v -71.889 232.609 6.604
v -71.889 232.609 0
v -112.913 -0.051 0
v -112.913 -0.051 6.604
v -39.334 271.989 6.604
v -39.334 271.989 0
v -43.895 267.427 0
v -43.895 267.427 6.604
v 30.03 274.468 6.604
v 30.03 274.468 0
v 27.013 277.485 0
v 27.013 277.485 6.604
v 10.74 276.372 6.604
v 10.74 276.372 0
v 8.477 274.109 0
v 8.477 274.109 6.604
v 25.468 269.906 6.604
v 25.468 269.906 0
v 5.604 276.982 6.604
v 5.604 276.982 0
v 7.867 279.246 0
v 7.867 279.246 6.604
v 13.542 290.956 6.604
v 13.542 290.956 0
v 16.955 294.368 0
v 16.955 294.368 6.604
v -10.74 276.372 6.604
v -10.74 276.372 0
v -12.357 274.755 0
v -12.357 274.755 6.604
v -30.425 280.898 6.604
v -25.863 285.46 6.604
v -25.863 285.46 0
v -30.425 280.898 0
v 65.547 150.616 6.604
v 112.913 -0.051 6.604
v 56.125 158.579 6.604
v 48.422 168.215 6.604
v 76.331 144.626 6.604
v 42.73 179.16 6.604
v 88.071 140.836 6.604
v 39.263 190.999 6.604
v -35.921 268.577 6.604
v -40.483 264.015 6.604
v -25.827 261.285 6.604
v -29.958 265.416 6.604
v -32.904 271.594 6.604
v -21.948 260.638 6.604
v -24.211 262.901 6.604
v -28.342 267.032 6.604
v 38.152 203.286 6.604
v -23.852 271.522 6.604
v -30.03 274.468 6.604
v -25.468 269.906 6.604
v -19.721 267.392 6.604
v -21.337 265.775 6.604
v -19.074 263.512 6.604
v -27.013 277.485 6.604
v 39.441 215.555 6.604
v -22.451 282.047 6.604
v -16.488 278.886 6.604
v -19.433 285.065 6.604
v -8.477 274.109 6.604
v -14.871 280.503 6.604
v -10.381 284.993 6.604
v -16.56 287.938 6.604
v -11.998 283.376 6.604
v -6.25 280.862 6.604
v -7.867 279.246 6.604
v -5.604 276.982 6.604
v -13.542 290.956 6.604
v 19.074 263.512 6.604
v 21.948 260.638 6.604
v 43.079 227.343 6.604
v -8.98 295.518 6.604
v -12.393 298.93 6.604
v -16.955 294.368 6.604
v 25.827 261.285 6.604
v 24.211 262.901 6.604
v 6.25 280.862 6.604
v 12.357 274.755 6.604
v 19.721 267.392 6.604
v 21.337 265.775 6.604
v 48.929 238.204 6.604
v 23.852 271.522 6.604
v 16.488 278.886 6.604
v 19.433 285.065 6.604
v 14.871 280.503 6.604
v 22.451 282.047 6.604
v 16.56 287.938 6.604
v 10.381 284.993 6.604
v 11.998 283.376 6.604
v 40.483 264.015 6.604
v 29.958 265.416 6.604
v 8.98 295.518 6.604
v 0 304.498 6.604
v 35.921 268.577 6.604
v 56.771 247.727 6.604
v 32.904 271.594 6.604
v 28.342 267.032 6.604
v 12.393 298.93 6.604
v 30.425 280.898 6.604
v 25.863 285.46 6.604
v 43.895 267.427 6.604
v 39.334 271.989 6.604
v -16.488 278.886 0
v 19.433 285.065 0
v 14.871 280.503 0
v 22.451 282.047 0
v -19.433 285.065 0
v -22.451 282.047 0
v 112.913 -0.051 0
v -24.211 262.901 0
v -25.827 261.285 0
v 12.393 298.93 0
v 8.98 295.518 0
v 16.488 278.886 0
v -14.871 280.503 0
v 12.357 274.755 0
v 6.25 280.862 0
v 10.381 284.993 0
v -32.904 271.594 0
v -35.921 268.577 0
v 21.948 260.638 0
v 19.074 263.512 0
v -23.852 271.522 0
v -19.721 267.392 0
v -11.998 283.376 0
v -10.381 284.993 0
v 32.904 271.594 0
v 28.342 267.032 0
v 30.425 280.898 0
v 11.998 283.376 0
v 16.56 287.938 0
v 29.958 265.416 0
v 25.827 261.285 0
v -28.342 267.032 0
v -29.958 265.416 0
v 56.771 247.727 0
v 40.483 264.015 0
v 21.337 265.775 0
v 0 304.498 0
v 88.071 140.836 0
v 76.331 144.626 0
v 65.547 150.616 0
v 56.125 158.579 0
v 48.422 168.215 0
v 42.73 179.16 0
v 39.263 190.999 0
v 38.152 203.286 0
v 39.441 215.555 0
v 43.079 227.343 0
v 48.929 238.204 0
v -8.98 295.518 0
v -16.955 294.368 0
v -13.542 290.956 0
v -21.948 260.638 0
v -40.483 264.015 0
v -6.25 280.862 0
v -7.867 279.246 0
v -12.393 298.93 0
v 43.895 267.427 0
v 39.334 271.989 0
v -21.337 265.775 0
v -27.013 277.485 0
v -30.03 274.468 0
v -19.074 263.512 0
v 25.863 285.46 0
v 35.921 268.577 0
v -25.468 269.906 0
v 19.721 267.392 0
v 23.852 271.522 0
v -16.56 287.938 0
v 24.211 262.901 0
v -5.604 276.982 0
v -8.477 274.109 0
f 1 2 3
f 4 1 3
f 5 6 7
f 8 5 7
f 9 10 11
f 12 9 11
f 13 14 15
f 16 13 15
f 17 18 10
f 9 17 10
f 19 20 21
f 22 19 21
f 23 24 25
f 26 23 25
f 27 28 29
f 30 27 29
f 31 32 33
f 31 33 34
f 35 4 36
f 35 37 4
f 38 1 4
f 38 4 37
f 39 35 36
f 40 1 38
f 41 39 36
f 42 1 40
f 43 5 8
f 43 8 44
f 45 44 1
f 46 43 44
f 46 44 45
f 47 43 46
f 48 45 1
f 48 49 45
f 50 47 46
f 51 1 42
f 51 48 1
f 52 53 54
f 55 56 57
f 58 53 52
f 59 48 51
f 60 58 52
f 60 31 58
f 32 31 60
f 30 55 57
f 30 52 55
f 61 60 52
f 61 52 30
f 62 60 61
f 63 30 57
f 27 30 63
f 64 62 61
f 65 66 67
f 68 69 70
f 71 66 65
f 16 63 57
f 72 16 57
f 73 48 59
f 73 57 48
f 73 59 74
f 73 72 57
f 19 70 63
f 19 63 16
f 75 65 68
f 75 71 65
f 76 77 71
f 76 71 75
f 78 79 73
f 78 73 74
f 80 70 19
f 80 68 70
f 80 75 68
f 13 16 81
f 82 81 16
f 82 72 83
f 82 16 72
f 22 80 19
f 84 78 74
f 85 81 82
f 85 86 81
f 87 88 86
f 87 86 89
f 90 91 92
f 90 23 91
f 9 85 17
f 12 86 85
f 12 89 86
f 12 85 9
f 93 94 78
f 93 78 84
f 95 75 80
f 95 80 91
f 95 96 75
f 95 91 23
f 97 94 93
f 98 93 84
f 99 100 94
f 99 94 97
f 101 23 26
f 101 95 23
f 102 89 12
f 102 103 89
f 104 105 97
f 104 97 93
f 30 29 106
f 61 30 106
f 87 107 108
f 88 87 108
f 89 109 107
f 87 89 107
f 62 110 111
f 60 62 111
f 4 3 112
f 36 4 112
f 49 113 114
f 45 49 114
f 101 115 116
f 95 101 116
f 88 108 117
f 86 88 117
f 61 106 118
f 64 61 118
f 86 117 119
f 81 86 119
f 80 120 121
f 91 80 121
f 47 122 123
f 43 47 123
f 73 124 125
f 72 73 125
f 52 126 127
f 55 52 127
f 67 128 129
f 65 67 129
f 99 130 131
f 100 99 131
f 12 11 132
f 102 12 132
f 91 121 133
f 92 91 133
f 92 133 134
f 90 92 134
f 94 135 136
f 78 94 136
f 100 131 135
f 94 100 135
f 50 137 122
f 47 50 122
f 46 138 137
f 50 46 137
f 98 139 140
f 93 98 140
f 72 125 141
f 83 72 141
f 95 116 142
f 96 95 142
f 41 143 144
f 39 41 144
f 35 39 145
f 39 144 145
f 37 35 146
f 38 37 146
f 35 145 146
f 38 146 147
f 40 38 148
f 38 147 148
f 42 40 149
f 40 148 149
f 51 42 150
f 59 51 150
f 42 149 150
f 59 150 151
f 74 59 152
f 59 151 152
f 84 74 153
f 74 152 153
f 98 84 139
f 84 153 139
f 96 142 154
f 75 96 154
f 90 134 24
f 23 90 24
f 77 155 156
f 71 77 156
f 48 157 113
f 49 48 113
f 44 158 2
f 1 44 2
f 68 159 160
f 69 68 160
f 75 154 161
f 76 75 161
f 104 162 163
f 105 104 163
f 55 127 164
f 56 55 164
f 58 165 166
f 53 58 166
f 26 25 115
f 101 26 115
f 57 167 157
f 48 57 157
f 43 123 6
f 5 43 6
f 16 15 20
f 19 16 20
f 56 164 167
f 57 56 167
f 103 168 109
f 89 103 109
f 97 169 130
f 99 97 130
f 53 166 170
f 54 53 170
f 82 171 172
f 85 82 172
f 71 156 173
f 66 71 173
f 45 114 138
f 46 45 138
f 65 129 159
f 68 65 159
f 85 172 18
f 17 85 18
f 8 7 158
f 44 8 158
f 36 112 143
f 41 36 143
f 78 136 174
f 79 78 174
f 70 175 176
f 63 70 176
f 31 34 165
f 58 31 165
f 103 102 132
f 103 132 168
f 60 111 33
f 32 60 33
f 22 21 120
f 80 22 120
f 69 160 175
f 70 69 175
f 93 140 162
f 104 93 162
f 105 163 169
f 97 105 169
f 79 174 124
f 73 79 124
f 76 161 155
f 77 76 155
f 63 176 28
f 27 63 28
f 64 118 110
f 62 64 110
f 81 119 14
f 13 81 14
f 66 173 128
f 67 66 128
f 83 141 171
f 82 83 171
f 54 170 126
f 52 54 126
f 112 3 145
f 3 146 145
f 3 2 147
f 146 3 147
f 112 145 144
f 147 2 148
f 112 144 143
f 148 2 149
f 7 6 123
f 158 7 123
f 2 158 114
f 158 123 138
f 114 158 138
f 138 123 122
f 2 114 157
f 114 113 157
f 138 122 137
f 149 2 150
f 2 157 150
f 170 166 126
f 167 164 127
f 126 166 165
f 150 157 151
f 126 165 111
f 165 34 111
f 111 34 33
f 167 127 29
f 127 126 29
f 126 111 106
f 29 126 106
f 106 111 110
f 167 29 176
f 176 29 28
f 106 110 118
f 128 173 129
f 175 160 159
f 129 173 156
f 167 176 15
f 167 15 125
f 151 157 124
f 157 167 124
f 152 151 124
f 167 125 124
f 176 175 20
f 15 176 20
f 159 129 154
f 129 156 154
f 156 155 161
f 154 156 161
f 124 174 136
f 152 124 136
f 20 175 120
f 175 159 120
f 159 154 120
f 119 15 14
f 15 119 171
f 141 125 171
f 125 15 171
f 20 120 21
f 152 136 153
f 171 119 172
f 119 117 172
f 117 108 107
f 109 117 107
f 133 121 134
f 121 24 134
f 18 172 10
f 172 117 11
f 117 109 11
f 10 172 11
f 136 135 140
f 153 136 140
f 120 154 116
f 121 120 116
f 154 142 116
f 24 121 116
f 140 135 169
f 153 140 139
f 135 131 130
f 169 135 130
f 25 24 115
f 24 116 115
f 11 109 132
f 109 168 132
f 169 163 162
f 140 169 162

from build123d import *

# Parameters (mm, degrees)
BOSS_EXTRUDE1_DEPTH = 6.604
CUT_EXTRUDE1_DEPTH  = 325.737846372
BOSS_EXTRUDE2_DEPTH = 6.604
SKETCH6_R           = 63.5
CUT_EXTRUDE2_DEPTH  = 325.737846372
MOVE_FACE1_DEPTH    = 6.604


# Read off the part's stored shape, not the designer's step: Move Face1
with BuildPart() as part:
    # Sketch1 → Boss-Extrude1 (new body)
    with BuildSketch(Plane.XY):
        Polygon((0, 304.426146798), (71.842048969, 232.584097829), (112.8529007, 0), (0, 0), (-112.8529007, 0), (-71.842048969, 232.584097829), align=None)
    extrude(amount=BOSS_EXTRUDE1_DEPTH)

    # Sketch4 → Cut-Extrude1 (cut, through all)
    with BuildSketch(Plane.XY.offset(6.604)):
        Polygon((-11.997622178, 283.448268499), (-16.487750238, 287.93839656), (-19.433274246, 284.992872552), (-14.943146185, 280.502744491), (-16.559592287, 278.88629839), (-12.356832423, 274.683538525), (-10.740386321, 276.299984627), (-8.477361778, 274.036960084), (-5.531837771, 276.982484092), (-7.794862313, 279.245508635), (-6.178416211, 280.861954736), (-10.381176076, 285.064714601), align=None)
        Polygon((-25.468006359, 269.977884318), (-29.95813442, 274.468012378), (-32.903658428, 271.52248837), (-28.413530367, 267.03236031), (-30.029976469, 265.415914208), (-25.827216604, 261.213154343), (-24.210770502, 262.829600445), (-21.94774596, 260.566575903), (-19.002221952, 263.51209991), (-21.265246495, 265.775124453), (-19.648800393, 267.391570555), (-23.851560258, 271.594330419), align=None)
        Polygon((16.487750238, 287.93839656), (11.997622178, 283.448268499), (10.381176076, 285.064714601), (6.178416211, 280.861954736), (7.794862313, 279.245508635), (5.531837771, 276.982484092), (8.477361778, 274.036960084), (10.740386321, 276.299984627), (12.356832423, 274.683538525), (16.559592287, 278.88629839), (14.943146185, 280.502744491), (19.433274246, 284.992872552), align=None)
        Polygon((29.95813442, 274.468012378), (25.468006359, 269.977884318), (23.851560258, 271.594330419), (19.648800393, 267.391570555), (21.265246495, 265.775124453), (19.002221952, 263.51209991), (21.94774596, 260.566575903), (24.210770502, 262.829600445), (25.827216604, 261.213154343), (30.029976469, 265.415914208), (28.413530367, 267.03236031), (32.903658428, 271.52248837), align=None)
    extrude(amount=-CUT_EXTRUDE1_DEPTH, mode=Mode.SUBTRACT)

    # Sketch5 → Boss-Extrude2 (add)
    with BuildSketch(Plane.XY.offset(6.604)):
        Polygon((-12.392753447, 298.858388003), (-8.980256121, 295.445890677), (-13.470384182, 290.955762616), (-16.882881508, 294.368259942), align=None)
        Polygon((-25.863137629, 285.388003821), (-22.450640303, 281.975506495), (-26.940768363, 277.485378435), (-30.353265689, 280.897875761), align=None)
        Polygon((-43.823649871, 267.427491579), (-40.411152545, 264.014994253), (-35.921024484, 268.505122314), (-39.33352181, 271.91761964), align=None)
        Polygon((12.392753447, 298.858388003), (8.980256121, 295.445890677), (13.470384182, 290.955762616), (16.882881508, 294.368259942), align=None)
        Polygon((22.450640303, 281.975506495), (25.863137629, 285.388003821), (30.353265689, 280.897875761), (26.940768363, 277.485378435), align=None)
        Polygon((35.921024484, 268.505122314), (39.33352181, 271.91761964), (43.823649871, 267.427491579), (40.411152545, 264.014994253), align=None)
    extrude(amount=-BOSS_EXTRUDE2_DEPTH)

    # Sketch6 → Cut-Extrude2 (cut, through all)
    with BuildSketch(Plane.XY.offset(6.604)):
        with Locations((101.6, 202.826146798)):
            Circle(SKETCH6_R)
    extrude(amount=-CUT_EXTRUDE2_DEPTH, mode=Mode.SUBTRACT)

    # Move Face1 outline → Move Face1 (add)
    with BuildSketch(Plane.XY):
        with BuildLine():
            Line((56.770575824, 247.727413023), (40.482994594, 264.014994253))
            Line((40.482994594, 264.014994253), (43.89549192, 267.427491579))
            Line((43.89549192, 267.427491579), (39.33352181, 271.989461689))
            Line((39.33352181, 271.989461689), (35.921024484, 268.576964363))
            Line((35.921024484, 268.576964363), (32.903658428, 271.594330419))
            Line((32.903658428, 271.594330419), (28.341688318, 267.03236031))
            Line((28.341688318, 267.03236031), (29.95813442, 265.415914208))
            Line((29.95813442, 265.415914208), (25.827216604, 261.284996392))
            Line((25.827216604, 261.284996392), (24.210770502, 262.901442494))
            Line((24.210770502, 262.901442494), (21.94774596, 260.638417952))
            Line((21.94774596, 260.638417952), (19.074064001, 263.51209991))
            Line((19.074064001, 263.51209991), (21.337088544, 265.775124453))
            Line((21.337088544, 265.775124453), (19.720642442, 267.391570555))
            Line((19.720642442, 267.391570555), (23.851560258, 271.52248837))
            Line((23.851560258, 271.52248837), (25.468006359, 269.906042269))
            Line((25.468006359, 269.906042269), (30.029976469, 274.468012378))
            Line((30.029976469, 274.468012378), (27.012610412, 277.485378435))
            Line((27.012610412, 277.485378435), (30.425107738, 280.897875761))
            Line((30.425107738, 280.897875761), (25.863137629, 285.45984587))
            Line((25.863137629, 285.45984587), (22.450640303, 282.047348544))
            Line((22.450640303, 282.047348544), (19.433274246, 285.064714601))
            Line((19.433274246, 285.064714601), (14.871304136, 280.502744491))
            Line((14.871304136, 280.502744491), (16.487750238, 278.88629839))
            Line((16.487750238, 278.88629839), (12.356832423, 274.755380574))
            Line((12.356832423, 274.755380574), (10.740386321, 276.371826676))
            Line((10.740386321, 276.371826676), (8.477361778, 274.108802133))
            Line((8.477361778, 274.108802133), (5.60367982, 276.982484092))
            Line((5.60367982, 276.982484092), (7.866704362, 279.245508635))
            Line((7.866704362, 279.245508635), (6.25025826, 280.861954736))
            Line((6.25025826, 280.861954736), (10.381176076, 284.992872552))
            Line((10.381176076, 284.992872552), (11.997622178, 283.37642645))
            Line((11.997622178, 283.37642645), (16.559592287, 287.93839656))
            Line((16.559592287, 287.93839656), (13.542226231, 290.955762616))
            Line((13.542226231, 290.955762616), (16.954723557, 294.368259942))
            Line((16.954723557, 294.368259942), (12.392753447, 298.930230052))
            Line((12.392753447, 298.930230052), (8.980256121, 295.517732726))
            Line((8.980256121, 295.517732726), (0, 304.497988847))
            Line((0, 304.497988847), (-8.980256121, 295.517732726))
            Line((-8.980256121, 295.517732726), (-12.392753447, 298.930230052))
            Line((-12.392753447, 298.930230052), (-16.954723557, 294.368259942))
            Line((-16.954723557, 294.368259942), (-13.542226231, 290.955762616))
            Line((-13.542226231, 290.955762616), (-16.559592287, 287.93839656))
            Line((-16.559592287, 287.93839656), (-11.997622178, 283.37642645))
            Line((-11.997622178, 283.37642645), (-10.381176076, 284.992872552))
            Line((-10.381176076, 284.992872552), (-6.25025826, 280.861954736))
            Line((-6.25025826, 280.861954736), (-7.866704362, 279.245508635))
            Line((-7.866704362, 279.245508635), (-5.60367982, 276.982484092))
            Line((-5.60367982, 276.982484092), (-8.477361778, 274.108802133))
            Line((-8.477361778, 274.108802133), (-10.740386321, 276.371826676))
            Line((-10.740386321, 276.371826676), (-12.356832423, 274.755380574))
            Line((-12.356832423, 274.755380574), (-16.487750238, 278.88629839))
            Line((-16.487750238, 278.88629839), (-14.871304136, 280.502744491))
            Line((-14.871304136, 280.502744491), (-19.433274246, 285.064714601))
            Line((-19.433274246, 285.064714601), (-22.450640303, 282.047348544))
            Line((-22.450640303, 282.047348544), (-25.863137629, 285.45984587))
            Line((-25.863137629, 285.45984587), (-30.425107738, 280.897875761))
            Line((-30.425107738, 280.897875761), (-27.012610412, 277.485378435))
            Line((-27.012610412, 277.485378435), (-30.029976469, 274.468012378))
            Line((-30.029976469, 274.468012378), (-25.468006359, 269.906042269))
            Line((-25.468006359, 269.906042269), (-23.851560258, 271.52248837))
            Line((-23.851560258, 271.52248837), (-19.720642442, 267.391570555))
            Line((-19.720642442, 267.391570555), (-21.337088544, 265.775124453))
            Line((-21.337088544, 265.775124453), (-19.074064001, 263.51209991))
            Line((-19.074064001, 263.51209991), (-21.94774596, 260.638417952))
            Line((-21.94774596, 260.638417952), (-24.210770502, 262.901442494))
            Line((-24.210770502, 262.901442494), (-25.827216604, 261.284996392))
            Line((-25.827216604, 261.284996392), (-29.95813442, 265.415914208))
            Line((-29.95813442, 265.415914208), (-28.341688318, 267.03236031))
            Line((-28.341688318, 267.03236031), (-32.903658428, 271.594330419))
            Line((-32.903658428, 271.594330419), (-35.921024484, 268.576964363))
            Line((-35.921024484, 268.576964363), (-39.33352181, 271.989461689))
            Line((-39.33352181, 271.989461689), (-43.89549192, 267.427491579))
            Line((-43.89549192, 267.427491579), (-40.482994594, 264.014994253))
            Line((-40.482994594, 264.014994253), (-71.889295849, 232.608692998))
            Line((-71.889295849, 232.608692998), (-112.913441782, -0.0508))
            Line((-112.913441782, -0.0508), (112.913441782, -0.0508))
            Line((112.913441782, -0.0508), (88.071293124, 140.836026046))
            ThreePointArc((88.071293124, 140.836026046), (40.707800027, 184.995247686), (56.770575824, 247.727413023))
        make_face()
        with BuildLine():
            Line((43.823649871, 267.427491579), (40.411152545, 264.014994253))
            Line((40.411152545, 264.014994253), (56.698719395, 247.727427403))
            ThreePointArc((56.698719395, 247.727427403), (40.661404518, 184.972923541), (88.027178445, 140.793667281))
            Line((88.027178445, 140.793667281), (112.8529007, 0))
            Line((112.8529007, 0), (-112.8529007, 0))
            Line((-112.8529007, 0), (-71.842048969, 232.584097829))
            Line((-71.842048969, 232.584097829), (-40.411152545, 264.014994253))
            Line((-40.411152545, 264.014994253), (-43.823649871, 267.427491579))
            Line((-43.823649871, 267.427491579), (-39.33352181, 271.91761964))
            Line((-39.33352181, 271.91761964), (-35.921024484, 268.505122314))
            Line((-35.921024484, 268.505122314), (-32.903658428, 271.52248837))
            Line((-32.903658428, 271.52248837), (-28.413530367, 267.03236031))
            Line((-28.413530367, 267.03236031), (-30.029976469, 265.415914208))
            Line((-30.029976469, 265.415914208), (-25.827216604, 261.213154343))
            Line((-25.827216604, 261.213154343), (-24.210770502, 262.829600445))
            Line((-24.210770502, 262.829600445), (-21.94774596, 260.566575903))
            Line((-21.94774596, 260.566575903), (-19.002221952, 263.51209991))
            Line((-19.002221952, 263.51209991), (-21.265246495, 265.775124453))
            Line((-21.265246495, 265.775124453), (-19.648800393, 267.391570555))
            Line((-19.648800393, 267.391570555), (-23.851560258, 271.594330419))
            Line((-23.851560258, 271.594330419), (-25.468006359, 269.977884318))
            Line((-25.468006359, 269.977884318), (-29.95813442, 274.468012378))
            Line((-29.95813442, 274.468012378), (-26.940768363, 277.485378435))
            Line((-26.940768363, 277.485378435), (-30.353265689, 280.897875761))
            Line((-30.353265689, 280.897875761), (-25.863137629, 285.388003821))
            Line((-25.863137629, 285.388003821), (-22.450640303, 281.975506495))
            Line((-22.450640303, 281.975506495), (-19.433274246, 284.992872552))
            Line((-19.433274246, 284.992872552), (-14.943146185, 280.502744491))
            Line((-14.943146185, 280.502744491), (-16.559592287, 278.88629839))
            Line((-16.559592287, 278.88629839), (-12.356832423, 274.683538525))
            Line((-12.356832423, 274.683538525), (-10.740386321, 276.299984627))
            Line((-10.740386321, 276.299984627), (-8.477361778, 274.036960084))
            Line((-8.477361778, 274.036960084), (-5.531837771, 276.982484092))
            Line((-5.531837771, 276.982484092), (-7.794862313, 279.245508635))
            Line((-7.794862313, 279.245508635), (-6.178416211, 280.861954736))
            Line((-6.178416211, 280.861954736), (-10.381176076, 285.064714601))
            Line((-10.381176076, 285.064714601), (-11.997622178, 283.448268499))
            Line((-11.997622178, 283.448268499), (-16.487750238, 287.93839656))
            Line((-16.487750238, 287.93839656), (-13.470384182, 290.955762616))
            Line((-13.470384182, 290.955762616), (-16.882881508, 294.368259942))
            Line((-16.882881508, 294.368259942), (-12.392753447, 298.858388003))
            Line((-12.392753447, 298.858388003), (-8.980256121, 295.445890677))
            Line((-8.980256121, 295.445890677), (0, 304.426146798))
            Line((0, 304.426146798), (8.980256121, 295.445890677))
            Line((8.980256121, 295.445890677), (12.392753447, 298.858388003))
            Line((12.392753447, 298.858388003), (16.882881508, 294.368259942))
            Line((16.882881508, 294.368259942), (13.470384182, 290.955762616))
            Line((13.470384182, 290.955762616), (16.487750238, 287.93839656))
            Line((16.487750238, 287.93839656), (11.997622178, 283.448268499))
            Line((11.997622178, 283.448268499), (10.381176076, 285.064714601))
            Line((10.381176076, 285.064714601), (6.178416211, 280.861954736))
            Line((6.178416211, 280.861954736), (7.794862313, 279.245508635))
            Line((7.794862313, 279.245508635), (5.531837771, 276.982484092))
            Line((5.531837771, 276.982484092), (8.477361778, 274.036960084))
            Line((8.477361778, 274.036960084), (10.740386321, 276.299984627))
            Line((10.740386321, 276.299984627), (12.356832423, 274.683538525))
            Line((12.356832423, 274.683538525), (16.559592287, 278.88629839))
            Line((16.559592287, 278.88629839), (14.943146185, 280.502744491))
            Line((14.943146185, 280.502744491), (19.433274246, 284.992872552))
            Line((19.433274246, 284.992872552), (22.450640303, 281.975506495))
            Line((22.450640303, 281.975506495), (25.863137629, 285.388003821))
            Line((25.863137629, 285.388003821), (30.353265689, 280.897875761))
            Line((30.353265689, 280.897875761), (26.940768363, 277.485378435))
            Line((26.940768363, 277.485378435), (29.95813442, 274.468012378))
            Line((29.95813442, 274.468012378), (25.468006359, 269.977884318))
            Line((25.468006359, 269.977884318), (23.851560258, 271.594330419))
            Line((23.851560258, 271.594330419), (19.648800393, 267.391570555))
            Line((19.648800393, 267.391570555), (21.265246495, 265.775124453))
            Line((21.265246495, 265.775124453), (19.002221952, 263.51209991))
            Line((19.002221952, 263.51209991), (21.94774596, 260.566575903))
            Line((21.94774596, 260.566575903), (24.210770502, 262.829600445))
            Line((24.210770502, 262.829600445), (25.827216604, 261.213154343))
            Line((25.827216604, 261.213154343), (30.029976469, 265.415914208))
            Line((30.029976469, 265.415914208), (28.413530367, 267.03236031))
            Line((28.413530367, 267.03236031), (32.903658428, 271.52248837))
            Line((32.903658428, 271.52248837), (35.921024484, 268.505122314))
            Line((35.921024484, 268.505122314), (39.33352181, 271.91761964))
            Line((39.33352181, 271.91761964), (43.823649871, 267.427491579))
        make_face(mode=Mode.SUBTRACT)
    extrude(amount=MOVE_FACE1_DEPTH)


solid = part.part
